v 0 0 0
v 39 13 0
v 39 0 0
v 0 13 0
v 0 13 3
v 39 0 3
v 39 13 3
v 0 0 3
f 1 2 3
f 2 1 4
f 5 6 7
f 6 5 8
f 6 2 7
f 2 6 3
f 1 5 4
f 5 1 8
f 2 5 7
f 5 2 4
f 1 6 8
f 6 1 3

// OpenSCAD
sockets=[13,12,10];
space=1;
thickness=3;
depth=0;

holes(array=sockets,gap=space,height=thickness,open=false);
body(array=sockets,gap=space,height=thickness,depth=depth,open=false);

function getDistances(array,gap=0) = [for (sum=0, i=0; i<=len(array); sum=sum+array[i]+gap, i=i+1) sum];
function getLength(array,gap=0) = getDistances(array,gap)[len(array)];



module body(array,gap,height,depth=0,open)
{
    width=getLength(array,gap)+gap;
    real_depth=max(depth,max(array));
    cube([width,real_depth,height]);
}

module holes(array,gap,height,open)
{
    offx=getDistances(array,gap);
    
    translate([gap,0,0])
    {
        for(i=[0:1:len(array)-1])
        {
            translate([offx[i]+array[i]/2,array[i]/2,0])
            {
                #cylinder(d=array[i],h=height);
            }
        }
    }  
}
